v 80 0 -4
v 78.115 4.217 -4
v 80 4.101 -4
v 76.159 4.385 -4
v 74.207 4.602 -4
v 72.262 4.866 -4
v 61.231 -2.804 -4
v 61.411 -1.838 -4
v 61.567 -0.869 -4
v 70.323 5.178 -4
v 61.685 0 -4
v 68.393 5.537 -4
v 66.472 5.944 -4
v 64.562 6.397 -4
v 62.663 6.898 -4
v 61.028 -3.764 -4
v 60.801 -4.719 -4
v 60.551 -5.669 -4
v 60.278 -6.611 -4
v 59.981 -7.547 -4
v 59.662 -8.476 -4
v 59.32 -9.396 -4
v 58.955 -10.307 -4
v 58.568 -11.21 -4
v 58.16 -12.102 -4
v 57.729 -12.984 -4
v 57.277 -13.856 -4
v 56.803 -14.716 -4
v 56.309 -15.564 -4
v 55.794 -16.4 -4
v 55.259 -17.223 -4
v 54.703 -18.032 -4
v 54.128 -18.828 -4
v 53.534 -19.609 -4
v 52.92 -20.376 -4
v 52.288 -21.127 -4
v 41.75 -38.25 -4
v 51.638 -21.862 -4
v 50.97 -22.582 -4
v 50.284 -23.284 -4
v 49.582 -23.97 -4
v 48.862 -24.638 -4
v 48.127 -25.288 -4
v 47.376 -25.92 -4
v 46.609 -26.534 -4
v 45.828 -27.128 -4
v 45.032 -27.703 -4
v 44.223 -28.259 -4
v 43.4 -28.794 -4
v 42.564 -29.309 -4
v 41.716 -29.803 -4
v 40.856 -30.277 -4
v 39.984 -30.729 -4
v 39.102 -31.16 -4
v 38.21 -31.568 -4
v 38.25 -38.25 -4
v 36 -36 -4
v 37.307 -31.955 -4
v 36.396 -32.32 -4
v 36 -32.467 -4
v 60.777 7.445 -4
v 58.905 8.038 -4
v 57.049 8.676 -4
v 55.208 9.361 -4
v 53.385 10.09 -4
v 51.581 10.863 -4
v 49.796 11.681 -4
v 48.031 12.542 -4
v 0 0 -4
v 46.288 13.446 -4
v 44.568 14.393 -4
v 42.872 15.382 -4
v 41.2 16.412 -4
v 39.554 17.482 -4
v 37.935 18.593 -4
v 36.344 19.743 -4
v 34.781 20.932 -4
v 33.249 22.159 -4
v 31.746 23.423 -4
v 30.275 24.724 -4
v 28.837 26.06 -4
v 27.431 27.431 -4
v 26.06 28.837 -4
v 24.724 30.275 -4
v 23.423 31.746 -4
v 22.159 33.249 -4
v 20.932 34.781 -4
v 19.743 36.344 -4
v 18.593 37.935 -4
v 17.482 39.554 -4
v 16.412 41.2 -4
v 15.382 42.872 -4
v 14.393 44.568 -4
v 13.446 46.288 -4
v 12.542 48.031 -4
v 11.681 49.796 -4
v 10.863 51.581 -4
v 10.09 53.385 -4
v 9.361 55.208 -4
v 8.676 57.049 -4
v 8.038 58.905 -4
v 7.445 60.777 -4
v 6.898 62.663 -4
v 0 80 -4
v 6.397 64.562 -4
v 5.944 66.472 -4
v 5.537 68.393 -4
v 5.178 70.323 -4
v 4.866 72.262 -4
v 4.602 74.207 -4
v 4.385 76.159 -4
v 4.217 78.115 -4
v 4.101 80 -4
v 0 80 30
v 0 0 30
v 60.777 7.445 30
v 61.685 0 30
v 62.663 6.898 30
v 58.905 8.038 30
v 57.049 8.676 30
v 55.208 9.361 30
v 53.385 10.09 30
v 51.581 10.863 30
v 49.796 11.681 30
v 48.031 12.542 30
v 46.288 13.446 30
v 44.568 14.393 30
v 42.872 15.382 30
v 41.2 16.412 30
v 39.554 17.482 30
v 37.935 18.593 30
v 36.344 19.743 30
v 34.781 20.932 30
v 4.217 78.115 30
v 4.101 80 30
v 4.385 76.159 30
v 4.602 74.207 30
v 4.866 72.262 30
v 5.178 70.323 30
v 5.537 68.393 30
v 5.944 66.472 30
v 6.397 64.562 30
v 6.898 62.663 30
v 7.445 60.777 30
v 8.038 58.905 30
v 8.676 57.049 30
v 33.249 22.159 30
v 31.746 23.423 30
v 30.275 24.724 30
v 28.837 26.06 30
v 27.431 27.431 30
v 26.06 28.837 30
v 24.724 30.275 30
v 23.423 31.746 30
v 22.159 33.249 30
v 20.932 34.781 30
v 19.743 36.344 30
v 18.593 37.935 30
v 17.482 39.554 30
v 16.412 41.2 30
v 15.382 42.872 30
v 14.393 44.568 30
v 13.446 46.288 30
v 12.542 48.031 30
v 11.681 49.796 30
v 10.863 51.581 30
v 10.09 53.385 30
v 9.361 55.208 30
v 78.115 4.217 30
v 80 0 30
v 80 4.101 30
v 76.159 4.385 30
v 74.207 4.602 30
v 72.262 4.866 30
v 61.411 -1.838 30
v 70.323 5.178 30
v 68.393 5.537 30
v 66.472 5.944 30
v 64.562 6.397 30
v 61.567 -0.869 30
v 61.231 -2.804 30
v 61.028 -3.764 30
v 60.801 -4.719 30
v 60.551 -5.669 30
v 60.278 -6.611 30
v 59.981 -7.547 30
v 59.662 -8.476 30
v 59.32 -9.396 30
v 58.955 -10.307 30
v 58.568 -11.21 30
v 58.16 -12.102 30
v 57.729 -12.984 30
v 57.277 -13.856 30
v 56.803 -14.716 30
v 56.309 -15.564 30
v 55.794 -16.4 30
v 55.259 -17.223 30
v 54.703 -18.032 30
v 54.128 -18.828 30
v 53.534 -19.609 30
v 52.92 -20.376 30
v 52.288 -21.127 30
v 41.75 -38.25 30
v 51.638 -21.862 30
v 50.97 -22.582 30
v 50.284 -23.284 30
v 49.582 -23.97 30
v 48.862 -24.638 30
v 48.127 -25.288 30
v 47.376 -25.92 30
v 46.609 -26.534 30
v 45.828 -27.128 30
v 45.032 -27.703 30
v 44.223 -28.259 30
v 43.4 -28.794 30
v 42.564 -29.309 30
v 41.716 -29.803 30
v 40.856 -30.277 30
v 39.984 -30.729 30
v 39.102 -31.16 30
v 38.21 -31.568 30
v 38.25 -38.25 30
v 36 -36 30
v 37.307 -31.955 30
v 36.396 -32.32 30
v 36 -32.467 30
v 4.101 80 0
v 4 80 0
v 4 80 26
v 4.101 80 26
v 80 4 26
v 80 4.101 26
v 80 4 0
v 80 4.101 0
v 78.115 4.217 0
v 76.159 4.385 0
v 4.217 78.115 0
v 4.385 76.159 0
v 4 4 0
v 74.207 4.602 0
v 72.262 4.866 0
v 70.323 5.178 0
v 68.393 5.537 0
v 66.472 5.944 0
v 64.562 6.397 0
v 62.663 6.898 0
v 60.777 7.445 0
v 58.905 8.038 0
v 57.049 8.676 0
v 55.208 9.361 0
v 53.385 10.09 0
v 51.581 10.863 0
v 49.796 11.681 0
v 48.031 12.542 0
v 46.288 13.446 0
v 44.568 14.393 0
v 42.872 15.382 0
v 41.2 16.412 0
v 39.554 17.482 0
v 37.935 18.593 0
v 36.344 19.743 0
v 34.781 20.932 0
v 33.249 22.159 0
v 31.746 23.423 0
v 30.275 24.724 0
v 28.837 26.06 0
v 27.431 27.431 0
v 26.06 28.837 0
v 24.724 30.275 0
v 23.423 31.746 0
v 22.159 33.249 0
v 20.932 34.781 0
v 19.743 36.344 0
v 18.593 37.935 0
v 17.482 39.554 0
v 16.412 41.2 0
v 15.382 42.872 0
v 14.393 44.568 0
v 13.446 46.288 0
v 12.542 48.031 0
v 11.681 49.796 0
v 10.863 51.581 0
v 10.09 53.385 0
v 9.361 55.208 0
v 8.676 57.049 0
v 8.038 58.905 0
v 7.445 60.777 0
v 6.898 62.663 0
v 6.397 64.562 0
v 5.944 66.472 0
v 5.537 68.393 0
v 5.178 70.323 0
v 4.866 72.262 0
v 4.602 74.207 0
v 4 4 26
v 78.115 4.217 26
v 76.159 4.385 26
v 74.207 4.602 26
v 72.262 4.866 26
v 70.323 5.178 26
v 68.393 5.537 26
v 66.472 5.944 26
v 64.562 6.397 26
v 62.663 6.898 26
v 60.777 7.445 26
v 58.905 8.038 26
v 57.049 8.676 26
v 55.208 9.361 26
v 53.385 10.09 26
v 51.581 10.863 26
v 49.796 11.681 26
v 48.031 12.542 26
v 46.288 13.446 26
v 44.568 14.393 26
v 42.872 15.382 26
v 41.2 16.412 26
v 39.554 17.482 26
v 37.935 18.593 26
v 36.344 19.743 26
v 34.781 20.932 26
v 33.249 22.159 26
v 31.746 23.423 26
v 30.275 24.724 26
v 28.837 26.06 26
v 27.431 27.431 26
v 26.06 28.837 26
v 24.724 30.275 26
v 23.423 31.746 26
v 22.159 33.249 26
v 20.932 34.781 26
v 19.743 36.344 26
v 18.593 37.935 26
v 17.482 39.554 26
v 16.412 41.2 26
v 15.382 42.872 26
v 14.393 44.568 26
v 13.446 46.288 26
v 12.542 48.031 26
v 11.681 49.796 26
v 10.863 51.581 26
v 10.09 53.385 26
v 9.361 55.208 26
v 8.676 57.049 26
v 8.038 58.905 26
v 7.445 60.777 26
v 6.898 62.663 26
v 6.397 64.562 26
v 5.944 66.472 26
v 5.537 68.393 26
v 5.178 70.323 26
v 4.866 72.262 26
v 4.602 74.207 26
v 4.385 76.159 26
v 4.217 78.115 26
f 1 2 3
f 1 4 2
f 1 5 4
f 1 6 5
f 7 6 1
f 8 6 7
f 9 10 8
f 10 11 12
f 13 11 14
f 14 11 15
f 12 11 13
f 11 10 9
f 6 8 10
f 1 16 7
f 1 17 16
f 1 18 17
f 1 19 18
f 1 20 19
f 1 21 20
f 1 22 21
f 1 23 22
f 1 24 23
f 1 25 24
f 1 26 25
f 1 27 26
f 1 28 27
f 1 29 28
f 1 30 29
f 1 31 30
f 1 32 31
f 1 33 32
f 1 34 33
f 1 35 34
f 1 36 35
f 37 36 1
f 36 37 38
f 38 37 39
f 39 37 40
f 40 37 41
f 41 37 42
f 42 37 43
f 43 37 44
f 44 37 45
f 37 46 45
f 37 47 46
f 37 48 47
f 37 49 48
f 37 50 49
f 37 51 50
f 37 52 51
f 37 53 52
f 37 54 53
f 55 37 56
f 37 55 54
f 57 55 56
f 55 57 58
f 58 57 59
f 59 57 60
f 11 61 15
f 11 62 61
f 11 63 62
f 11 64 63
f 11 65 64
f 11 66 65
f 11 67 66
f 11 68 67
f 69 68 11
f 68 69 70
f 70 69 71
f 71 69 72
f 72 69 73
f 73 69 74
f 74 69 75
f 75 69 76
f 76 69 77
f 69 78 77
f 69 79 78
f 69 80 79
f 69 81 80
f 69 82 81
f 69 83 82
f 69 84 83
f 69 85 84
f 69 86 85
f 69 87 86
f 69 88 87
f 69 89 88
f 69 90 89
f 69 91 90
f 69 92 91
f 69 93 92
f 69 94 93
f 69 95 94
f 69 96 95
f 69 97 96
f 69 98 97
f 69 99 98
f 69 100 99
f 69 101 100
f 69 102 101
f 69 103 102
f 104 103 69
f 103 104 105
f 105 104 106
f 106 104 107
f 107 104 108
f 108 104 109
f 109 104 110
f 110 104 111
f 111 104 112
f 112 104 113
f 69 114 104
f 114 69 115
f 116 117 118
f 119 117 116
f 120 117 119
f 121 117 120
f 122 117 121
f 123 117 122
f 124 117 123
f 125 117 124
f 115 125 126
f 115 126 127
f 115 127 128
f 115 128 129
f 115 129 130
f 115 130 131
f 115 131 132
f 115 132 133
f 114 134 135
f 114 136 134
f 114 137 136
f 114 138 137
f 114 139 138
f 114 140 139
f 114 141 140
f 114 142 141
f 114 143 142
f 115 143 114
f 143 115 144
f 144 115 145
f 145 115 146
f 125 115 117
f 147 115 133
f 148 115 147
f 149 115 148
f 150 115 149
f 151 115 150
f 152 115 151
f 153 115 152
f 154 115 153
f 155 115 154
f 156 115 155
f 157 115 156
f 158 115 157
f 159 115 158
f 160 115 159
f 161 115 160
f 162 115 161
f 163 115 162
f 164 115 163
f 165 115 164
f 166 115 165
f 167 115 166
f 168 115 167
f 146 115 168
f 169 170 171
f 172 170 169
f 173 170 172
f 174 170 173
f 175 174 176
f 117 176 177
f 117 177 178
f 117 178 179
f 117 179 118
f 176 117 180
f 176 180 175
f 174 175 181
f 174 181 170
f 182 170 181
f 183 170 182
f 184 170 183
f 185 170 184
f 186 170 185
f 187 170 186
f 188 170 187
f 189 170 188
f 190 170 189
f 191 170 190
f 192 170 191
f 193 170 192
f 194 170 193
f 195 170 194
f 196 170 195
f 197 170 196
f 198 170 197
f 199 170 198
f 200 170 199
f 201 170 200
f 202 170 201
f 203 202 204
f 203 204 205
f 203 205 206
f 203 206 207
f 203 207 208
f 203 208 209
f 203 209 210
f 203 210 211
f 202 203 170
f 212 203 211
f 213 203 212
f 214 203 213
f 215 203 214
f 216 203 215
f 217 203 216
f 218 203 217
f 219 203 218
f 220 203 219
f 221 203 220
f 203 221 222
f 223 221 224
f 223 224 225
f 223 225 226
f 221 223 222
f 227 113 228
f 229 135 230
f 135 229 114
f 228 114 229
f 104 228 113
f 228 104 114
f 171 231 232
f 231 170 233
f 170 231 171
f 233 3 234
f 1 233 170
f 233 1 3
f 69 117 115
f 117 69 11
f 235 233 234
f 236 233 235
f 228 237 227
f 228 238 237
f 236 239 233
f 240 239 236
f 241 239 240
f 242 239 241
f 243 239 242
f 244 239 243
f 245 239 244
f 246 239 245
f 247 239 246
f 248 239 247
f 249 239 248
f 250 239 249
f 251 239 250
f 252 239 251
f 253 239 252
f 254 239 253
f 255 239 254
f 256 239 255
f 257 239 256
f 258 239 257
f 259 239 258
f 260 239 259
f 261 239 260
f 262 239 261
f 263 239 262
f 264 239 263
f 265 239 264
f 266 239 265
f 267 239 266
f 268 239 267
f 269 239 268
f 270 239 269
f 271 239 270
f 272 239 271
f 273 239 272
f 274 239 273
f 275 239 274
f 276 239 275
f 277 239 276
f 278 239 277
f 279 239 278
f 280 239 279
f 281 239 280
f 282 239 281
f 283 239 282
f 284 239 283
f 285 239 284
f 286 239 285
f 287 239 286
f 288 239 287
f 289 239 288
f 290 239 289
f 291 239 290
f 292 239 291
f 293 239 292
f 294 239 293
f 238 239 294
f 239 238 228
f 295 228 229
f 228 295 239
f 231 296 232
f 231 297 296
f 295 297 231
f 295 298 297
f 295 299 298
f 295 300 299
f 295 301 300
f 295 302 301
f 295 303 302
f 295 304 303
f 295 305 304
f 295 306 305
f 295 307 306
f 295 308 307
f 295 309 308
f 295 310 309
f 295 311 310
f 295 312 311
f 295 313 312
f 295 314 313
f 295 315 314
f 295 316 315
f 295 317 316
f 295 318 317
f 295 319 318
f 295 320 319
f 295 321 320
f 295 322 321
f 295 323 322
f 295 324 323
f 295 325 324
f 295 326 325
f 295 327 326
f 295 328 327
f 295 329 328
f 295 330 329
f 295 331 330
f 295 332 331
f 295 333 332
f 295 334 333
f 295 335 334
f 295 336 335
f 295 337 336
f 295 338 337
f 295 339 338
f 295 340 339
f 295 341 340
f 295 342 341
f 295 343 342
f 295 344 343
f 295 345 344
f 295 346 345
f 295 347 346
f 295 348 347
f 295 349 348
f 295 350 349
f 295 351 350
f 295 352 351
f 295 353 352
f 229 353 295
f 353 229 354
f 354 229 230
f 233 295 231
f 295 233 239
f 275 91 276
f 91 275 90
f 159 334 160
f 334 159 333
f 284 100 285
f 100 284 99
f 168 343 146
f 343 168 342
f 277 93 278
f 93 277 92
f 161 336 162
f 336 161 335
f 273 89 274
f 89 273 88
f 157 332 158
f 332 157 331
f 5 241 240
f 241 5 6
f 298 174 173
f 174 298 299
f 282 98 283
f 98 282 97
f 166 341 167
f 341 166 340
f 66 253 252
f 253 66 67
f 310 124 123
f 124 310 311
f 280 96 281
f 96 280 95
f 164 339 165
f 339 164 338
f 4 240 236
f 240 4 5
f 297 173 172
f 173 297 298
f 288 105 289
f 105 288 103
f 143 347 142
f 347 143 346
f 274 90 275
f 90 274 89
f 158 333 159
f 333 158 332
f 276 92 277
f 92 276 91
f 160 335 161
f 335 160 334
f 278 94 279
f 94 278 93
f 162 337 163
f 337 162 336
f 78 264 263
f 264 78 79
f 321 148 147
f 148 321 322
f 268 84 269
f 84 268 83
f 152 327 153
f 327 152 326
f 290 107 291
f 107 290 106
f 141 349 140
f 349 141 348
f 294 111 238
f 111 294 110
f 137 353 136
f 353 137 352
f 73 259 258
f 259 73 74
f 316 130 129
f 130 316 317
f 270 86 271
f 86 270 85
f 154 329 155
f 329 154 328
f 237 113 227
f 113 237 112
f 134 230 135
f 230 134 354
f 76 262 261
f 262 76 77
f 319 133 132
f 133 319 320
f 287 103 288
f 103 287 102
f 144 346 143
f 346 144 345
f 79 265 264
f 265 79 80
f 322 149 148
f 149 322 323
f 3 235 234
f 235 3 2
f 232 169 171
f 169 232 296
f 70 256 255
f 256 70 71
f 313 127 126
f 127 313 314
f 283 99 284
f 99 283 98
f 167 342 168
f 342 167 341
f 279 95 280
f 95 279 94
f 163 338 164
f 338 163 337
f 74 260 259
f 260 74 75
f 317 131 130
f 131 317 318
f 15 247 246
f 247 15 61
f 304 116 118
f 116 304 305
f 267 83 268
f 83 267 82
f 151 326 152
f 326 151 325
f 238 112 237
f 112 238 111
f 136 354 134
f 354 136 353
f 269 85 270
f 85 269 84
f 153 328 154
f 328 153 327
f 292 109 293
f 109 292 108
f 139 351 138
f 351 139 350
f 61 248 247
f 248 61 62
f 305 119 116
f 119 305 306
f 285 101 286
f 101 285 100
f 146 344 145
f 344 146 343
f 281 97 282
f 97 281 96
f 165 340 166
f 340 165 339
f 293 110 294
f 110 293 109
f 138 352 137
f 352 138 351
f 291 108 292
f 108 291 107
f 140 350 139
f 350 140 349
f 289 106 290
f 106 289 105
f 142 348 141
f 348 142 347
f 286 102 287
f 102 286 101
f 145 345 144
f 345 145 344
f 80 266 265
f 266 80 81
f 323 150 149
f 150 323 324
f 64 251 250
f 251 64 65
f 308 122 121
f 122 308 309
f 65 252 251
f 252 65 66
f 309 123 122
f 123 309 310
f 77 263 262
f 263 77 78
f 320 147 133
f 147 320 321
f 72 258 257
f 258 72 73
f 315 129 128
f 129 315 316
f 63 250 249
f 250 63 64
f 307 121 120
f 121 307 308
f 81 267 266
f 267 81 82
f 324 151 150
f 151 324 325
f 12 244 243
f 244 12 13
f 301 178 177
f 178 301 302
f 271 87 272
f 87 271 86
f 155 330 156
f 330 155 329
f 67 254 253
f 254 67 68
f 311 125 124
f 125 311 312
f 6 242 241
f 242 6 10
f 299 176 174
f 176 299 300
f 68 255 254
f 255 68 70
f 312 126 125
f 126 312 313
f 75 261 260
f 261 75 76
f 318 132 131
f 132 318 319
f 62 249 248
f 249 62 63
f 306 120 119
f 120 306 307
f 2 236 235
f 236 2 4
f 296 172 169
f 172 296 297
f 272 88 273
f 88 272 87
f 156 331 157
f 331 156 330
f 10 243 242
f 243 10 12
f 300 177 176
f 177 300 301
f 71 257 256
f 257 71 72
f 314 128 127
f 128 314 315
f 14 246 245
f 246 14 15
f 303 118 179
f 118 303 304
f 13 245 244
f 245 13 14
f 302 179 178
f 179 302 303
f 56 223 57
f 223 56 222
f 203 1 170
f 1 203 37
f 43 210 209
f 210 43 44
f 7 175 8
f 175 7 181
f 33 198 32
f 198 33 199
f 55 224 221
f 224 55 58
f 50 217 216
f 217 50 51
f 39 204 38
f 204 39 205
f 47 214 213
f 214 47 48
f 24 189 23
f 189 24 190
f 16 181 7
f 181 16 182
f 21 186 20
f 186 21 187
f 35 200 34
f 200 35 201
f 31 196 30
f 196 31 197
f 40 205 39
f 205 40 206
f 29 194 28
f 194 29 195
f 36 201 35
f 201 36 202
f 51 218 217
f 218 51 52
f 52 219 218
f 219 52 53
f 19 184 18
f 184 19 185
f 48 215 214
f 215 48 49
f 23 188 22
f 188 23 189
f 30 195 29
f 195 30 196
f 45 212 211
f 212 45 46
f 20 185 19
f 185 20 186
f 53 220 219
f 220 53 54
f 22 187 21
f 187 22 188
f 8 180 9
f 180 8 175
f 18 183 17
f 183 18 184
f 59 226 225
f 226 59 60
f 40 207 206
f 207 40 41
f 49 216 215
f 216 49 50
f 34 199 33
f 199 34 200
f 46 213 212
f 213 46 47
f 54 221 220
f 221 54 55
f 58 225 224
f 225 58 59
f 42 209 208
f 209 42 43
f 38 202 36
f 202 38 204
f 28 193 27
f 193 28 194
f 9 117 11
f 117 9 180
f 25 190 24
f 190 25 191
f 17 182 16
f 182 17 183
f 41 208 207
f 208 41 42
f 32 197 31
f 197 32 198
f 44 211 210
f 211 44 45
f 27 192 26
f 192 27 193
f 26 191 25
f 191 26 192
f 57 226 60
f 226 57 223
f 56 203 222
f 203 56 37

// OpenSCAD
desk_thickness = 26;

clip_wall_thickness = 4;

clip_depth = 80;

union() {
  difference() {
    translate([0, 0, clip_wall_thickness*-1])
      linear_extrude(height=(desk_thickness+(clip_wall_thickness*2)))
        square([clip_depth, clip_depth], center=false);
    translate([clip_wall_thickness, clip_wall_thickness, 0])
      linear_extrude(height=desk_thickness)
        square([clip_depth, clip_depth], center=false);
    translate([clip_depth+clip_wall_thickness, clip_depth+clip_wall_thickness, (clip_wall_thickness*-1)-1])
      linear_extrude(height=(desk_thickness+(clip_wall_thickness*2)+2))
        circle(clip_depth, $fn=256);
  };
  difference() {
    translate([0, 0, clip_wall_thickness*-1])
      linear_extrude(height=(desk_thickness+(clip_wall_thickness*2)))
        polygon(points=[[0, 0], [clip_depth, 0], [clip_depth/2, clip_depth/-2]]);
    translate([22, 5, (clip_wall_thickness*-1)-1])
      linear_extrude(height=(desk_thickness+(clip_wall_thickness*2)+2))
        circle(clip_depth/2, $fn=256);
    translate([0, clip_depth*-1, (clip_wall_thickness*-1)-1])
      linear_extrude(height=((desk_thickness+(clip_wall_thickness*2))+2))
        square([36, clip_depth], center=false);
    translate([0, -118.25, (clip_wall_thickness*-1)-1])
      linear_extrude(height=((desk_thickness+(clip_wall_thickness*2))+2))
        square([clip_depth, clip_depth], center=false);
  };
}
